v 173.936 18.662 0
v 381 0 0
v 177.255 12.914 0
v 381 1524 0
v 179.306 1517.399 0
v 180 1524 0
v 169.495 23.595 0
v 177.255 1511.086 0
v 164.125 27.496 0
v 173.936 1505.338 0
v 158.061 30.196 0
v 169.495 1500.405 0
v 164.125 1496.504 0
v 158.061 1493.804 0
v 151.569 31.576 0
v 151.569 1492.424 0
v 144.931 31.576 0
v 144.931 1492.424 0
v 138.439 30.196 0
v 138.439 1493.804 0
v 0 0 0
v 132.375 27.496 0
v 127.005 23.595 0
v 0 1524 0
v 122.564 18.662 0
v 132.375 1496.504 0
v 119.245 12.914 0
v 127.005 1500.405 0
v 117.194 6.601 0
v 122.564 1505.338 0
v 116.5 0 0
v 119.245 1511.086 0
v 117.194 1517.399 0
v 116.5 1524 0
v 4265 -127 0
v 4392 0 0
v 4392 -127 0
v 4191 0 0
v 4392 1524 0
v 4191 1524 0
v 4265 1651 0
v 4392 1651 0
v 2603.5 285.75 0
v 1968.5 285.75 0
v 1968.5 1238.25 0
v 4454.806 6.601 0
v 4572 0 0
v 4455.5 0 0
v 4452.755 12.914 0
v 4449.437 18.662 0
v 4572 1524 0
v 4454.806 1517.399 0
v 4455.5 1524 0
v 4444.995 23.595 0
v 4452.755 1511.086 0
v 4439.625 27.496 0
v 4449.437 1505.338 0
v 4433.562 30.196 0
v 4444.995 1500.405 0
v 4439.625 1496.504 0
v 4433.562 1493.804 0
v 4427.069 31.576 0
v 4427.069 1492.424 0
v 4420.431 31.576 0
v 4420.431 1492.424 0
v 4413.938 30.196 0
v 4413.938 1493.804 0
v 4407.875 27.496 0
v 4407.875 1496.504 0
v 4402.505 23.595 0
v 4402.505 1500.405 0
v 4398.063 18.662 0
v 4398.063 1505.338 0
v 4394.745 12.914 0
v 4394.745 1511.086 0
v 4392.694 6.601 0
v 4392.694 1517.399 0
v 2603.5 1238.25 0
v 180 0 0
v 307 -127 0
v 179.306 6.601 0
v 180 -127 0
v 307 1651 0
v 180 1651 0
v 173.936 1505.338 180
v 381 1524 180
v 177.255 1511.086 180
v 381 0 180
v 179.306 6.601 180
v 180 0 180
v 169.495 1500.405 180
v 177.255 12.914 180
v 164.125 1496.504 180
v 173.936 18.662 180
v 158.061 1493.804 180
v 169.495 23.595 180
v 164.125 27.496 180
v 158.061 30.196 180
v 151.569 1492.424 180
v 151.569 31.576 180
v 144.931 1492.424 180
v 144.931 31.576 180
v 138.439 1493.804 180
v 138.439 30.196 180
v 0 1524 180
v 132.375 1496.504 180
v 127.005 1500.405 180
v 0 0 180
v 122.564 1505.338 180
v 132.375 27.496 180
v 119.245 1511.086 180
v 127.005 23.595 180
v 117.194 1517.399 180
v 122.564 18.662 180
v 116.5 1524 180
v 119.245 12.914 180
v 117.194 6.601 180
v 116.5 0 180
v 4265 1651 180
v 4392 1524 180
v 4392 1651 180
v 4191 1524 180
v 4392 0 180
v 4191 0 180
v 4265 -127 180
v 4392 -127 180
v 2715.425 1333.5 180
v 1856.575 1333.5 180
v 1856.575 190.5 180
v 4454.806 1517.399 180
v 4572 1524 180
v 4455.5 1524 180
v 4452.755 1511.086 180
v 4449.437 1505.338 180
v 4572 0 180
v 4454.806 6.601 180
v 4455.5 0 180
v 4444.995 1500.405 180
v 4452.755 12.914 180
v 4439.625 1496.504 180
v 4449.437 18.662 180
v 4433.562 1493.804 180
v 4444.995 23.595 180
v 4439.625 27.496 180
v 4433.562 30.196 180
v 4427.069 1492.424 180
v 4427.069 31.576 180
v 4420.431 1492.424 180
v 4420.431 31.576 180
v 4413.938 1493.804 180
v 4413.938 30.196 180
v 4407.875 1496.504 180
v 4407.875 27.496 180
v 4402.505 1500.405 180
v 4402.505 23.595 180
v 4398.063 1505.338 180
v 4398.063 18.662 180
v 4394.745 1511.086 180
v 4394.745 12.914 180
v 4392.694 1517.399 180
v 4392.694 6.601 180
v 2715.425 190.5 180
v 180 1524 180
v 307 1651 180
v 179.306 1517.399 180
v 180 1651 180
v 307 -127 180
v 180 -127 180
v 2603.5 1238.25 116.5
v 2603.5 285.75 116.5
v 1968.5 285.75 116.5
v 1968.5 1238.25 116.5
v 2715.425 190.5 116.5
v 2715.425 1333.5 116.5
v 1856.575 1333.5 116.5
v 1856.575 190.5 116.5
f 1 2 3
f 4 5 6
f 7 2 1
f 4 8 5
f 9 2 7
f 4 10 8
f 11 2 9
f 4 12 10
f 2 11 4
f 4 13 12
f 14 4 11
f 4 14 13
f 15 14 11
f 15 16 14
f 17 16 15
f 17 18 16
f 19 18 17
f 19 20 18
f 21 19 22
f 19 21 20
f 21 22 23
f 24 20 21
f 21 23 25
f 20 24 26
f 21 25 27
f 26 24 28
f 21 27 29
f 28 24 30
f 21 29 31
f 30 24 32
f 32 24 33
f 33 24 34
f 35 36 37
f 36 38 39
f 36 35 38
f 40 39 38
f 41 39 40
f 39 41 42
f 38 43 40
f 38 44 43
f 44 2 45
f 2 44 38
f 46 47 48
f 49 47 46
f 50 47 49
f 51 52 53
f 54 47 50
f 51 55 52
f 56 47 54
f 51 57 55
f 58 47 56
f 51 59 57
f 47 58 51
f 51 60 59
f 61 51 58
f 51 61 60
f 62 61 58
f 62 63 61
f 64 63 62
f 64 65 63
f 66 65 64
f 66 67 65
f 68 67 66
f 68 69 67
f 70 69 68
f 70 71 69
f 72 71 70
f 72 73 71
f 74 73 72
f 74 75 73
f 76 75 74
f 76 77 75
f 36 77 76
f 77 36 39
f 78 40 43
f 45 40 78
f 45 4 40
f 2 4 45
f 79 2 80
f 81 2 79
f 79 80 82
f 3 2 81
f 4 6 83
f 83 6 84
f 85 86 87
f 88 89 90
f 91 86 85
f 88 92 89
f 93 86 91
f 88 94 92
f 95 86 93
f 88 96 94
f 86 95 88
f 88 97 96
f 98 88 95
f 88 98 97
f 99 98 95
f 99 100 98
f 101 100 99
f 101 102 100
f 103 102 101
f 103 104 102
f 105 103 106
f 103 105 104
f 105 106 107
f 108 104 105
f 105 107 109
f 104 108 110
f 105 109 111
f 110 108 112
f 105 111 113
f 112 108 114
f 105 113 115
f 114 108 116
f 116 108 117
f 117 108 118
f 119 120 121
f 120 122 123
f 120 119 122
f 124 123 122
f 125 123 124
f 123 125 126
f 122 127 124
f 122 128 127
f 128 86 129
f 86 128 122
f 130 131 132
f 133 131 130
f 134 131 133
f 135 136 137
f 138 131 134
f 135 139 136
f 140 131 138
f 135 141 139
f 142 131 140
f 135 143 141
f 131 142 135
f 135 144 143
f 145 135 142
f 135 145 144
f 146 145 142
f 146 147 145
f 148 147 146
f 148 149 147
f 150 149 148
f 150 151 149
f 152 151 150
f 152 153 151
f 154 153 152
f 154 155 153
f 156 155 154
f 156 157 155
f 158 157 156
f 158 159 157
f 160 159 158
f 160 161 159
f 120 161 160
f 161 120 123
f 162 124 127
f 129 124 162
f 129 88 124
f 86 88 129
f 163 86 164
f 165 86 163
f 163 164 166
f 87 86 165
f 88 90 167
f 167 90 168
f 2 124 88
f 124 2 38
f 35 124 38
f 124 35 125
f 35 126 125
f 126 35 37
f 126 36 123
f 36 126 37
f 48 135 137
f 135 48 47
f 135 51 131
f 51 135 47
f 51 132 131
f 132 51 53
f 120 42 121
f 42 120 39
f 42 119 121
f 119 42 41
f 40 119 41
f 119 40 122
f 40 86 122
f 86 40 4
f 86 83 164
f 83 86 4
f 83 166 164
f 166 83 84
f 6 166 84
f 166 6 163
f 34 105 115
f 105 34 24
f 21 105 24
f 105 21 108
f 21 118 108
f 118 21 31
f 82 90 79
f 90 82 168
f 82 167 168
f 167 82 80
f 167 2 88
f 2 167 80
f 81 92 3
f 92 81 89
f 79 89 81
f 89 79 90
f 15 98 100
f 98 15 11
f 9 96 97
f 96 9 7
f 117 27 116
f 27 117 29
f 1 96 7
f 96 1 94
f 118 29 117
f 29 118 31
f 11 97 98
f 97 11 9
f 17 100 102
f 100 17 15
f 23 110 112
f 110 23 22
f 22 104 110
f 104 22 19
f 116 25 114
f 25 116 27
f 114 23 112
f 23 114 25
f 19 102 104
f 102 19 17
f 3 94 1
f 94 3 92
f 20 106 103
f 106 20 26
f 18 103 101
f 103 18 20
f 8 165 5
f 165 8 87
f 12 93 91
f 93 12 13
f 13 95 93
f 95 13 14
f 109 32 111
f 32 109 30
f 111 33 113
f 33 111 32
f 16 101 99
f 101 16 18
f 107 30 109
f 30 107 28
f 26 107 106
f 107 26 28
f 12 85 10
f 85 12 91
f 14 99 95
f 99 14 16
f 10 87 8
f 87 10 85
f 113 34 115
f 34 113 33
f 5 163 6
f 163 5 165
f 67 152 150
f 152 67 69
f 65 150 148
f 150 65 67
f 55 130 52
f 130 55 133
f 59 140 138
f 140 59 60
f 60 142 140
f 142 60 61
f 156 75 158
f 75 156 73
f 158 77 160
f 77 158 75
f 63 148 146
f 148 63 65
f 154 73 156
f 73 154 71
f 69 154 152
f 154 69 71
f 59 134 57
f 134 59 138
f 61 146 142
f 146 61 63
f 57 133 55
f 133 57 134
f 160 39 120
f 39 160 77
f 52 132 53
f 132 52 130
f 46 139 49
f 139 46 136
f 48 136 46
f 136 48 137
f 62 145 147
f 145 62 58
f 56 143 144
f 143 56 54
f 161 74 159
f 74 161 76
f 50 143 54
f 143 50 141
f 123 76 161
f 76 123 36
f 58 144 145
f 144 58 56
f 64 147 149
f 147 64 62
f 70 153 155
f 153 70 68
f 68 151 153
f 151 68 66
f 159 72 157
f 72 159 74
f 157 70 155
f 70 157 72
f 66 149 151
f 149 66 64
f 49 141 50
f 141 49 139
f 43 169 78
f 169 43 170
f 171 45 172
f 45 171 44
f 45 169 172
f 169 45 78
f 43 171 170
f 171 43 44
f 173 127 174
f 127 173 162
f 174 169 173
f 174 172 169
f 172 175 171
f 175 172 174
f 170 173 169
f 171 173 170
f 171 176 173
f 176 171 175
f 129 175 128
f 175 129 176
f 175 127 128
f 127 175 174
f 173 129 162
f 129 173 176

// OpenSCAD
// file: global_constants.scad
// unit = 0.1 mm
// 1 inch = 25.4 mm = 254 units

// Dimensions

// Sheet dimensions
sheet_x=24400;
sheet_y=12200;
sheet_z=180;

// Circular cnc routing holes
cnc_circle_r=31.750;
module routing_circle(x,y){
  translate([x,y]) linear_extrude(height=sheet_z) circle(cnc_circle_r);
}

bolt_circle_r=41.0210;
module bolt_circle(x,y){
  translate([x,y]) linear_extrude(height=sheet_z) circle(bolt_circle_r);
}

//Conversion
medievaltometric=254;
metrictomedieval=.0039370078;

// Use the metric system by default
// units="medieval";
units="metric";
// main file
// To render the DXF file from the command line:
// openscad -x light_plate.dxf -D'units="metric"' light_plate.scad

include <global_constants.scad>;

x1=381;//1.5"
x2=4572;//18"

x3=635;//2.5"
x4=858.8502;//3.3813"


y1=127;//.5"
y2=1524;//6"

y3=952.5;//3.75"
y4=1143;//4.5"

z1=63.5;//.25"

module light_plate(){
  difference(){
    linear_extrude(height=sheet_z)
      polygon([
        [0,0],
        [0,y2],[sheet_z,y2],[sheet_z,y2+y1],[sheet_z+y1,y2+y1],[x1,y2],
        [x2-x1,y2],[x2-sheet_z-y1,y2+y1],[x2-sheet_z,y2+y1],[x2-sheet_z,y2],[x2,y2],
        [x2,0],[x2-sheet_z,0],[x2-sheet_z,-y1],[x2-sheet_z-y1,-y1],[x2-x1,0],
        [x1,0],[sheet_z+y1,-y1],[sheet_z,-y1],[sheet_z,0],[0,0]]);
    routing_circle(sheet_z-cnc_circle_r,0);
    routing_circle(sheet_z-cnc_circle_r,y2);
    routing_circle(x2-sheet_z+cnc_circle_r,y2);
    routing_circle(x2-sheet_z+cnc_circle_r,0);
  }
}

module led_hole(){
  translate([x2/2,y2/2,sheet_z]) union(){
    translate([0,0,-sheet_z/2]) cube([x3,y3,sheet_z], center=true);
    translate([0,0,-z1/2]) cube([x4,y4,z1], center=true);
  }
}

render(convexity=10){
  difference(){
    light_plate();
    led_hole();
  }
}
